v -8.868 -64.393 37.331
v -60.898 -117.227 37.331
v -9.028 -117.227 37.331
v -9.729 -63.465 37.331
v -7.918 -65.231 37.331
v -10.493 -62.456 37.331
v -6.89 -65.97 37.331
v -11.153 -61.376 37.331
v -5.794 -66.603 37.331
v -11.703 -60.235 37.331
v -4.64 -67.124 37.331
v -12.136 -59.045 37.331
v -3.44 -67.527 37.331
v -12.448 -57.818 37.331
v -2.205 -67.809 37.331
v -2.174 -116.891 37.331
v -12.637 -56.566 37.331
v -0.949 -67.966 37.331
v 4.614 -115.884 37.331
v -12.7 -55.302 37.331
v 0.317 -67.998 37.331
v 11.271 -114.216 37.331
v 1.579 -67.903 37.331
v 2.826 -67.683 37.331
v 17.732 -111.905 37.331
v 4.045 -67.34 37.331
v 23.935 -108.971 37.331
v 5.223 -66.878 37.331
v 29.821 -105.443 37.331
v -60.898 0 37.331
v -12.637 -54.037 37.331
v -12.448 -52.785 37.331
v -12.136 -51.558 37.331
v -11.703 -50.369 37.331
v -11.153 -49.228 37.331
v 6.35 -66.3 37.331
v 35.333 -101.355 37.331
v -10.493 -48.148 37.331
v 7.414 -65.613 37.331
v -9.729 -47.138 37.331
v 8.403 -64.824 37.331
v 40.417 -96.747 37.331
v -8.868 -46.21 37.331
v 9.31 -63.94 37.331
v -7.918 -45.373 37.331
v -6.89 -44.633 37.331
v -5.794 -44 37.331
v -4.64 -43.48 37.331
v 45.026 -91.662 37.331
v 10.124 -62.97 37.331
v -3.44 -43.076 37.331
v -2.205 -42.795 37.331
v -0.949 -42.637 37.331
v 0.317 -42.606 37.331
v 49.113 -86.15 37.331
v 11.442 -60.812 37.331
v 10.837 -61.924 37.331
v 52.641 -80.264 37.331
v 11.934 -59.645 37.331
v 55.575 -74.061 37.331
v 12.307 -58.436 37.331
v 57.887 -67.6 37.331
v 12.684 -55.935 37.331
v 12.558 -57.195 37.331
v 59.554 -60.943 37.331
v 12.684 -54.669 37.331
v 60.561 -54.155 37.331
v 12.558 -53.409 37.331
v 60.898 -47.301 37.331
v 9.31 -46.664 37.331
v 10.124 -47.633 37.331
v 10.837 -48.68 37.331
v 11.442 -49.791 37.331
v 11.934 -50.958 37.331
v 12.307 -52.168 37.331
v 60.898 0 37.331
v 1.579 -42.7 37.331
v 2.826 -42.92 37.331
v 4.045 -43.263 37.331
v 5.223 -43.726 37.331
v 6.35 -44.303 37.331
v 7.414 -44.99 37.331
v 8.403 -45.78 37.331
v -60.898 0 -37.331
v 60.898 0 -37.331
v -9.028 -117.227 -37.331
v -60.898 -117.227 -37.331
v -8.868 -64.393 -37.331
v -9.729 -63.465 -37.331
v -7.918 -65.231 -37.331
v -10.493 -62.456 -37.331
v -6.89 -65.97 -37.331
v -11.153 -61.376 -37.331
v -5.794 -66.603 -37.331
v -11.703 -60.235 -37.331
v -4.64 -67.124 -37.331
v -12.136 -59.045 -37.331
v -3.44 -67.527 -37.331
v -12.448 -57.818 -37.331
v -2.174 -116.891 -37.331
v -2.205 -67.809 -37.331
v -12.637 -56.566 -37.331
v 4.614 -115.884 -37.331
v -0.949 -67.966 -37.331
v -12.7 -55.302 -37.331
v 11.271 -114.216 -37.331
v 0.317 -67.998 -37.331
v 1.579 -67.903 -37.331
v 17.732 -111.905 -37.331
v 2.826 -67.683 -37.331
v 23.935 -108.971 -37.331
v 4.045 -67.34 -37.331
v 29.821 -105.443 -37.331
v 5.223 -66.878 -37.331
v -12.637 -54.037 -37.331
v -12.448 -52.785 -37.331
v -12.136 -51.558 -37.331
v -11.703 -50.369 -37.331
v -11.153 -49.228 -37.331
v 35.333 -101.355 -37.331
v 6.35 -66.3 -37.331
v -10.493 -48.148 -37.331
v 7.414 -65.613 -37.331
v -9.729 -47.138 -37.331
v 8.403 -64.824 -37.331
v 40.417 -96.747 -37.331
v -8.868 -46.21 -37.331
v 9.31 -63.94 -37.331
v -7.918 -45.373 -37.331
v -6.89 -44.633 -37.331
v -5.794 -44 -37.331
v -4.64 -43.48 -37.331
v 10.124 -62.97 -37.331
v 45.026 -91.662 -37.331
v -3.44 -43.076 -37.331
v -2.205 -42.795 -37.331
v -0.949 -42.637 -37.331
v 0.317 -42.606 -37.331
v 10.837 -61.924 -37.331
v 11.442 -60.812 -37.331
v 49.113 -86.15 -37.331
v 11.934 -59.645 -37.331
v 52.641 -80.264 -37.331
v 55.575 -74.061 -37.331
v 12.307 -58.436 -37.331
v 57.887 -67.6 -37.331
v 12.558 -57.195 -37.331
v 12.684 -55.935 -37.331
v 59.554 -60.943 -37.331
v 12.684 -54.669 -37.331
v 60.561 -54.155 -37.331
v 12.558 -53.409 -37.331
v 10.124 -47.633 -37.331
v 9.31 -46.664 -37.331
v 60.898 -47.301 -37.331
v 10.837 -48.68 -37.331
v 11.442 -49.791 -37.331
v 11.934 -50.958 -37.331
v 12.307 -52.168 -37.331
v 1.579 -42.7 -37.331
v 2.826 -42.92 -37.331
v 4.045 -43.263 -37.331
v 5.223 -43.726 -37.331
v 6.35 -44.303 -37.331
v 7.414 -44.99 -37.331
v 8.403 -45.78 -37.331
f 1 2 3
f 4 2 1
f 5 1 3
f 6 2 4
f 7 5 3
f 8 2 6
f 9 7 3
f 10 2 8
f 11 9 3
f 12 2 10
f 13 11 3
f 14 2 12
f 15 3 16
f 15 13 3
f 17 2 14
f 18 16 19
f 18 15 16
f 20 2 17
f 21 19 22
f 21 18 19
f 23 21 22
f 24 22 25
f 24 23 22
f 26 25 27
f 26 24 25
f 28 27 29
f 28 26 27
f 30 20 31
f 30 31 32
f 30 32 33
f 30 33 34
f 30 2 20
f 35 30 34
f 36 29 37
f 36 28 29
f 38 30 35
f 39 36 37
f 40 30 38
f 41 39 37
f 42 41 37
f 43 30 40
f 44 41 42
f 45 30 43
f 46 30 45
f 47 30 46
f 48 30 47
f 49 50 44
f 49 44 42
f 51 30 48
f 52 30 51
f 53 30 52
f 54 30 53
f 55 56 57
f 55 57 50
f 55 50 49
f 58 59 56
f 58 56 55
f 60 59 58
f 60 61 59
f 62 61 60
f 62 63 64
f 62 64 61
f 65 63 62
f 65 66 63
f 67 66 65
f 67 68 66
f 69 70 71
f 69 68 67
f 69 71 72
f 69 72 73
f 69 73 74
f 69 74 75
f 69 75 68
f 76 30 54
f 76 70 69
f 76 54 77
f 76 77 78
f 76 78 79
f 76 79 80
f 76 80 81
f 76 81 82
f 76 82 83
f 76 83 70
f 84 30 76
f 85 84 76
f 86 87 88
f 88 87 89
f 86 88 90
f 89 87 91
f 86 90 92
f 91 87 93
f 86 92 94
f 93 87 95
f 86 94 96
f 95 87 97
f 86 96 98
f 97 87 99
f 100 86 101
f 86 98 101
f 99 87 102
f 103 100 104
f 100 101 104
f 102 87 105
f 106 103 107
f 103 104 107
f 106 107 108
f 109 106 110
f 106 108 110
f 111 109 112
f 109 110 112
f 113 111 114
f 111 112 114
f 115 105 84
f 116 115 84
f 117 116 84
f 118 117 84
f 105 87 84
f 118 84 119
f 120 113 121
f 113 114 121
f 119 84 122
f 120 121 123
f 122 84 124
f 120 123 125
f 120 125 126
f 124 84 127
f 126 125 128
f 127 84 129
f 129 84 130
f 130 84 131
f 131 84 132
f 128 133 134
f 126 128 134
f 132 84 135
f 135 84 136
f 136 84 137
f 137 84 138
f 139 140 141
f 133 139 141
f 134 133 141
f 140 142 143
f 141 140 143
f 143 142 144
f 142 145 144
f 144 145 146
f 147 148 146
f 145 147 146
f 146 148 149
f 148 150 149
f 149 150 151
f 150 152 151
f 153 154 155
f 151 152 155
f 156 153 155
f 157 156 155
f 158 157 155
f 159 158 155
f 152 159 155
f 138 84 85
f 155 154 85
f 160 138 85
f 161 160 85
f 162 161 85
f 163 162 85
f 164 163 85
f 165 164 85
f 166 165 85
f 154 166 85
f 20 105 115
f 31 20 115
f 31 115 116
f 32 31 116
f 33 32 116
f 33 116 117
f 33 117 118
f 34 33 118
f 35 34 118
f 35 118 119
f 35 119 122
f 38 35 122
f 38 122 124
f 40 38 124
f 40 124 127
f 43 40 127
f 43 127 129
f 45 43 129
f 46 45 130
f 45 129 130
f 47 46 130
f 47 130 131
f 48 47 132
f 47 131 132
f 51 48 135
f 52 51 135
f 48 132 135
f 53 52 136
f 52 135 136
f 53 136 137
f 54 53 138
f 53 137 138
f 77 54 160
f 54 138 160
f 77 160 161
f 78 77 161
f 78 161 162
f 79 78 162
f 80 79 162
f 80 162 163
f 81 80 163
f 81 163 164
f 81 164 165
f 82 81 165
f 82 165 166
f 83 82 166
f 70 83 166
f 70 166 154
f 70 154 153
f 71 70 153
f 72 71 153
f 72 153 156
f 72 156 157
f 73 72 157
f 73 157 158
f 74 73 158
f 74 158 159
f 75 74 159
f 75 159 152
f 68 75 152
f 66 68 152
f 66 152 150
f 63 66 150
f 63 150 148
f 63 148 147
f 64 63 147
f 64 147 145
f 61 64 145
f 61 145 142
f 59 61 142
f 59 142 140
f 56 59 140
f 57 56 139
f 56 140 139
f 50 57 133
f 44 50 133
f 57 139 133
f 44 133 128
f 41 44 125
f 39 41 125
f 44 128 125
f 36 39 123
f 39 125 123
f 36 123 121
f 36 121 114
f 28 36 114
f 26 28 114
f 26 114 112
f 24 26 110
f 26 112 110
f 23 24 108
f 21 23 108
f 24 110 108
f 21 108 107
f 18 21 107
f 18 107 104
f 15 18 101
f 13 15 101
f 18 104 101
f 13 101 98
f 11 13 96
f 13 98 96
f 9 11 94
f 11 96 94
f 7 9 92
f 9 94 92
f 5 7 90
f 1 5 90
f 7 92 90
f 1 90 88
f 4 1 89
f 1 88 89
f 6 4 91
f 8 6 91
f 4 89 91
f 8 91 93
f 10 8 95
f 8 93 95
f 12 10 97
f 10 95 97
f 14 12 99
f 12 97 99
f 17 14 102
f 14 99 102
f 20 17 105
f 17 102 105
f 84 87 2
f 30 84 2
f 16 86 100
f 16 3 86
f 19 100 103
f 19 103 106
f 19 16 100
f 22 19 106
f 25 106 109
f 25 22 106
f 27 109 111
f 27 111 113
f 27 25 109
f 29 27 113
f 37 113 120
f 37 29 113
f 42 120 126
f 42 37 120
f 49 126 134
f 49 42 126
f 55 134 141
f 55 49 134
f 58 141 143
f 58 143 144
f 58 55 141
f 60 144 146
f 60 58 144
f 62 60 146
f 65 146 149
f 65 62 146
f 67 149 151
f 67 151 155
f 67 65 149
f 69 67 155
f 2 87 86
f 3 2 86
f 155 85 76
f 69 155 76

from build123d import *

# Parameters (mm, degrees)
F0_W     = 121.796116
F0_H     = 74.661746
F1_DEPTH = 117.227465
F3_D     = 25.4
F4_R     = 69.925974


with BuildPart() as f1:
    # F0 (on Front) → F1 (new body)
    with BuildSketch(Plane.XZ):
        Rectangle(F0_W, F0_H)
    extrude(amount=F1_DEPTH)

    # F3 (through all)
    with Locations(Plane.XY.offset(37.330873)):
        with Locations((0, -55.301771)):
            Hole(F3_D / 2)

    # F4
    f4_edges = [f1.edges().sort_by_distance(p)[0] for p in [
        (60.898058, -117.227465, 0),
    ]]
    fillet(f4_edges, radius=F4_R)


solid = f1.part
